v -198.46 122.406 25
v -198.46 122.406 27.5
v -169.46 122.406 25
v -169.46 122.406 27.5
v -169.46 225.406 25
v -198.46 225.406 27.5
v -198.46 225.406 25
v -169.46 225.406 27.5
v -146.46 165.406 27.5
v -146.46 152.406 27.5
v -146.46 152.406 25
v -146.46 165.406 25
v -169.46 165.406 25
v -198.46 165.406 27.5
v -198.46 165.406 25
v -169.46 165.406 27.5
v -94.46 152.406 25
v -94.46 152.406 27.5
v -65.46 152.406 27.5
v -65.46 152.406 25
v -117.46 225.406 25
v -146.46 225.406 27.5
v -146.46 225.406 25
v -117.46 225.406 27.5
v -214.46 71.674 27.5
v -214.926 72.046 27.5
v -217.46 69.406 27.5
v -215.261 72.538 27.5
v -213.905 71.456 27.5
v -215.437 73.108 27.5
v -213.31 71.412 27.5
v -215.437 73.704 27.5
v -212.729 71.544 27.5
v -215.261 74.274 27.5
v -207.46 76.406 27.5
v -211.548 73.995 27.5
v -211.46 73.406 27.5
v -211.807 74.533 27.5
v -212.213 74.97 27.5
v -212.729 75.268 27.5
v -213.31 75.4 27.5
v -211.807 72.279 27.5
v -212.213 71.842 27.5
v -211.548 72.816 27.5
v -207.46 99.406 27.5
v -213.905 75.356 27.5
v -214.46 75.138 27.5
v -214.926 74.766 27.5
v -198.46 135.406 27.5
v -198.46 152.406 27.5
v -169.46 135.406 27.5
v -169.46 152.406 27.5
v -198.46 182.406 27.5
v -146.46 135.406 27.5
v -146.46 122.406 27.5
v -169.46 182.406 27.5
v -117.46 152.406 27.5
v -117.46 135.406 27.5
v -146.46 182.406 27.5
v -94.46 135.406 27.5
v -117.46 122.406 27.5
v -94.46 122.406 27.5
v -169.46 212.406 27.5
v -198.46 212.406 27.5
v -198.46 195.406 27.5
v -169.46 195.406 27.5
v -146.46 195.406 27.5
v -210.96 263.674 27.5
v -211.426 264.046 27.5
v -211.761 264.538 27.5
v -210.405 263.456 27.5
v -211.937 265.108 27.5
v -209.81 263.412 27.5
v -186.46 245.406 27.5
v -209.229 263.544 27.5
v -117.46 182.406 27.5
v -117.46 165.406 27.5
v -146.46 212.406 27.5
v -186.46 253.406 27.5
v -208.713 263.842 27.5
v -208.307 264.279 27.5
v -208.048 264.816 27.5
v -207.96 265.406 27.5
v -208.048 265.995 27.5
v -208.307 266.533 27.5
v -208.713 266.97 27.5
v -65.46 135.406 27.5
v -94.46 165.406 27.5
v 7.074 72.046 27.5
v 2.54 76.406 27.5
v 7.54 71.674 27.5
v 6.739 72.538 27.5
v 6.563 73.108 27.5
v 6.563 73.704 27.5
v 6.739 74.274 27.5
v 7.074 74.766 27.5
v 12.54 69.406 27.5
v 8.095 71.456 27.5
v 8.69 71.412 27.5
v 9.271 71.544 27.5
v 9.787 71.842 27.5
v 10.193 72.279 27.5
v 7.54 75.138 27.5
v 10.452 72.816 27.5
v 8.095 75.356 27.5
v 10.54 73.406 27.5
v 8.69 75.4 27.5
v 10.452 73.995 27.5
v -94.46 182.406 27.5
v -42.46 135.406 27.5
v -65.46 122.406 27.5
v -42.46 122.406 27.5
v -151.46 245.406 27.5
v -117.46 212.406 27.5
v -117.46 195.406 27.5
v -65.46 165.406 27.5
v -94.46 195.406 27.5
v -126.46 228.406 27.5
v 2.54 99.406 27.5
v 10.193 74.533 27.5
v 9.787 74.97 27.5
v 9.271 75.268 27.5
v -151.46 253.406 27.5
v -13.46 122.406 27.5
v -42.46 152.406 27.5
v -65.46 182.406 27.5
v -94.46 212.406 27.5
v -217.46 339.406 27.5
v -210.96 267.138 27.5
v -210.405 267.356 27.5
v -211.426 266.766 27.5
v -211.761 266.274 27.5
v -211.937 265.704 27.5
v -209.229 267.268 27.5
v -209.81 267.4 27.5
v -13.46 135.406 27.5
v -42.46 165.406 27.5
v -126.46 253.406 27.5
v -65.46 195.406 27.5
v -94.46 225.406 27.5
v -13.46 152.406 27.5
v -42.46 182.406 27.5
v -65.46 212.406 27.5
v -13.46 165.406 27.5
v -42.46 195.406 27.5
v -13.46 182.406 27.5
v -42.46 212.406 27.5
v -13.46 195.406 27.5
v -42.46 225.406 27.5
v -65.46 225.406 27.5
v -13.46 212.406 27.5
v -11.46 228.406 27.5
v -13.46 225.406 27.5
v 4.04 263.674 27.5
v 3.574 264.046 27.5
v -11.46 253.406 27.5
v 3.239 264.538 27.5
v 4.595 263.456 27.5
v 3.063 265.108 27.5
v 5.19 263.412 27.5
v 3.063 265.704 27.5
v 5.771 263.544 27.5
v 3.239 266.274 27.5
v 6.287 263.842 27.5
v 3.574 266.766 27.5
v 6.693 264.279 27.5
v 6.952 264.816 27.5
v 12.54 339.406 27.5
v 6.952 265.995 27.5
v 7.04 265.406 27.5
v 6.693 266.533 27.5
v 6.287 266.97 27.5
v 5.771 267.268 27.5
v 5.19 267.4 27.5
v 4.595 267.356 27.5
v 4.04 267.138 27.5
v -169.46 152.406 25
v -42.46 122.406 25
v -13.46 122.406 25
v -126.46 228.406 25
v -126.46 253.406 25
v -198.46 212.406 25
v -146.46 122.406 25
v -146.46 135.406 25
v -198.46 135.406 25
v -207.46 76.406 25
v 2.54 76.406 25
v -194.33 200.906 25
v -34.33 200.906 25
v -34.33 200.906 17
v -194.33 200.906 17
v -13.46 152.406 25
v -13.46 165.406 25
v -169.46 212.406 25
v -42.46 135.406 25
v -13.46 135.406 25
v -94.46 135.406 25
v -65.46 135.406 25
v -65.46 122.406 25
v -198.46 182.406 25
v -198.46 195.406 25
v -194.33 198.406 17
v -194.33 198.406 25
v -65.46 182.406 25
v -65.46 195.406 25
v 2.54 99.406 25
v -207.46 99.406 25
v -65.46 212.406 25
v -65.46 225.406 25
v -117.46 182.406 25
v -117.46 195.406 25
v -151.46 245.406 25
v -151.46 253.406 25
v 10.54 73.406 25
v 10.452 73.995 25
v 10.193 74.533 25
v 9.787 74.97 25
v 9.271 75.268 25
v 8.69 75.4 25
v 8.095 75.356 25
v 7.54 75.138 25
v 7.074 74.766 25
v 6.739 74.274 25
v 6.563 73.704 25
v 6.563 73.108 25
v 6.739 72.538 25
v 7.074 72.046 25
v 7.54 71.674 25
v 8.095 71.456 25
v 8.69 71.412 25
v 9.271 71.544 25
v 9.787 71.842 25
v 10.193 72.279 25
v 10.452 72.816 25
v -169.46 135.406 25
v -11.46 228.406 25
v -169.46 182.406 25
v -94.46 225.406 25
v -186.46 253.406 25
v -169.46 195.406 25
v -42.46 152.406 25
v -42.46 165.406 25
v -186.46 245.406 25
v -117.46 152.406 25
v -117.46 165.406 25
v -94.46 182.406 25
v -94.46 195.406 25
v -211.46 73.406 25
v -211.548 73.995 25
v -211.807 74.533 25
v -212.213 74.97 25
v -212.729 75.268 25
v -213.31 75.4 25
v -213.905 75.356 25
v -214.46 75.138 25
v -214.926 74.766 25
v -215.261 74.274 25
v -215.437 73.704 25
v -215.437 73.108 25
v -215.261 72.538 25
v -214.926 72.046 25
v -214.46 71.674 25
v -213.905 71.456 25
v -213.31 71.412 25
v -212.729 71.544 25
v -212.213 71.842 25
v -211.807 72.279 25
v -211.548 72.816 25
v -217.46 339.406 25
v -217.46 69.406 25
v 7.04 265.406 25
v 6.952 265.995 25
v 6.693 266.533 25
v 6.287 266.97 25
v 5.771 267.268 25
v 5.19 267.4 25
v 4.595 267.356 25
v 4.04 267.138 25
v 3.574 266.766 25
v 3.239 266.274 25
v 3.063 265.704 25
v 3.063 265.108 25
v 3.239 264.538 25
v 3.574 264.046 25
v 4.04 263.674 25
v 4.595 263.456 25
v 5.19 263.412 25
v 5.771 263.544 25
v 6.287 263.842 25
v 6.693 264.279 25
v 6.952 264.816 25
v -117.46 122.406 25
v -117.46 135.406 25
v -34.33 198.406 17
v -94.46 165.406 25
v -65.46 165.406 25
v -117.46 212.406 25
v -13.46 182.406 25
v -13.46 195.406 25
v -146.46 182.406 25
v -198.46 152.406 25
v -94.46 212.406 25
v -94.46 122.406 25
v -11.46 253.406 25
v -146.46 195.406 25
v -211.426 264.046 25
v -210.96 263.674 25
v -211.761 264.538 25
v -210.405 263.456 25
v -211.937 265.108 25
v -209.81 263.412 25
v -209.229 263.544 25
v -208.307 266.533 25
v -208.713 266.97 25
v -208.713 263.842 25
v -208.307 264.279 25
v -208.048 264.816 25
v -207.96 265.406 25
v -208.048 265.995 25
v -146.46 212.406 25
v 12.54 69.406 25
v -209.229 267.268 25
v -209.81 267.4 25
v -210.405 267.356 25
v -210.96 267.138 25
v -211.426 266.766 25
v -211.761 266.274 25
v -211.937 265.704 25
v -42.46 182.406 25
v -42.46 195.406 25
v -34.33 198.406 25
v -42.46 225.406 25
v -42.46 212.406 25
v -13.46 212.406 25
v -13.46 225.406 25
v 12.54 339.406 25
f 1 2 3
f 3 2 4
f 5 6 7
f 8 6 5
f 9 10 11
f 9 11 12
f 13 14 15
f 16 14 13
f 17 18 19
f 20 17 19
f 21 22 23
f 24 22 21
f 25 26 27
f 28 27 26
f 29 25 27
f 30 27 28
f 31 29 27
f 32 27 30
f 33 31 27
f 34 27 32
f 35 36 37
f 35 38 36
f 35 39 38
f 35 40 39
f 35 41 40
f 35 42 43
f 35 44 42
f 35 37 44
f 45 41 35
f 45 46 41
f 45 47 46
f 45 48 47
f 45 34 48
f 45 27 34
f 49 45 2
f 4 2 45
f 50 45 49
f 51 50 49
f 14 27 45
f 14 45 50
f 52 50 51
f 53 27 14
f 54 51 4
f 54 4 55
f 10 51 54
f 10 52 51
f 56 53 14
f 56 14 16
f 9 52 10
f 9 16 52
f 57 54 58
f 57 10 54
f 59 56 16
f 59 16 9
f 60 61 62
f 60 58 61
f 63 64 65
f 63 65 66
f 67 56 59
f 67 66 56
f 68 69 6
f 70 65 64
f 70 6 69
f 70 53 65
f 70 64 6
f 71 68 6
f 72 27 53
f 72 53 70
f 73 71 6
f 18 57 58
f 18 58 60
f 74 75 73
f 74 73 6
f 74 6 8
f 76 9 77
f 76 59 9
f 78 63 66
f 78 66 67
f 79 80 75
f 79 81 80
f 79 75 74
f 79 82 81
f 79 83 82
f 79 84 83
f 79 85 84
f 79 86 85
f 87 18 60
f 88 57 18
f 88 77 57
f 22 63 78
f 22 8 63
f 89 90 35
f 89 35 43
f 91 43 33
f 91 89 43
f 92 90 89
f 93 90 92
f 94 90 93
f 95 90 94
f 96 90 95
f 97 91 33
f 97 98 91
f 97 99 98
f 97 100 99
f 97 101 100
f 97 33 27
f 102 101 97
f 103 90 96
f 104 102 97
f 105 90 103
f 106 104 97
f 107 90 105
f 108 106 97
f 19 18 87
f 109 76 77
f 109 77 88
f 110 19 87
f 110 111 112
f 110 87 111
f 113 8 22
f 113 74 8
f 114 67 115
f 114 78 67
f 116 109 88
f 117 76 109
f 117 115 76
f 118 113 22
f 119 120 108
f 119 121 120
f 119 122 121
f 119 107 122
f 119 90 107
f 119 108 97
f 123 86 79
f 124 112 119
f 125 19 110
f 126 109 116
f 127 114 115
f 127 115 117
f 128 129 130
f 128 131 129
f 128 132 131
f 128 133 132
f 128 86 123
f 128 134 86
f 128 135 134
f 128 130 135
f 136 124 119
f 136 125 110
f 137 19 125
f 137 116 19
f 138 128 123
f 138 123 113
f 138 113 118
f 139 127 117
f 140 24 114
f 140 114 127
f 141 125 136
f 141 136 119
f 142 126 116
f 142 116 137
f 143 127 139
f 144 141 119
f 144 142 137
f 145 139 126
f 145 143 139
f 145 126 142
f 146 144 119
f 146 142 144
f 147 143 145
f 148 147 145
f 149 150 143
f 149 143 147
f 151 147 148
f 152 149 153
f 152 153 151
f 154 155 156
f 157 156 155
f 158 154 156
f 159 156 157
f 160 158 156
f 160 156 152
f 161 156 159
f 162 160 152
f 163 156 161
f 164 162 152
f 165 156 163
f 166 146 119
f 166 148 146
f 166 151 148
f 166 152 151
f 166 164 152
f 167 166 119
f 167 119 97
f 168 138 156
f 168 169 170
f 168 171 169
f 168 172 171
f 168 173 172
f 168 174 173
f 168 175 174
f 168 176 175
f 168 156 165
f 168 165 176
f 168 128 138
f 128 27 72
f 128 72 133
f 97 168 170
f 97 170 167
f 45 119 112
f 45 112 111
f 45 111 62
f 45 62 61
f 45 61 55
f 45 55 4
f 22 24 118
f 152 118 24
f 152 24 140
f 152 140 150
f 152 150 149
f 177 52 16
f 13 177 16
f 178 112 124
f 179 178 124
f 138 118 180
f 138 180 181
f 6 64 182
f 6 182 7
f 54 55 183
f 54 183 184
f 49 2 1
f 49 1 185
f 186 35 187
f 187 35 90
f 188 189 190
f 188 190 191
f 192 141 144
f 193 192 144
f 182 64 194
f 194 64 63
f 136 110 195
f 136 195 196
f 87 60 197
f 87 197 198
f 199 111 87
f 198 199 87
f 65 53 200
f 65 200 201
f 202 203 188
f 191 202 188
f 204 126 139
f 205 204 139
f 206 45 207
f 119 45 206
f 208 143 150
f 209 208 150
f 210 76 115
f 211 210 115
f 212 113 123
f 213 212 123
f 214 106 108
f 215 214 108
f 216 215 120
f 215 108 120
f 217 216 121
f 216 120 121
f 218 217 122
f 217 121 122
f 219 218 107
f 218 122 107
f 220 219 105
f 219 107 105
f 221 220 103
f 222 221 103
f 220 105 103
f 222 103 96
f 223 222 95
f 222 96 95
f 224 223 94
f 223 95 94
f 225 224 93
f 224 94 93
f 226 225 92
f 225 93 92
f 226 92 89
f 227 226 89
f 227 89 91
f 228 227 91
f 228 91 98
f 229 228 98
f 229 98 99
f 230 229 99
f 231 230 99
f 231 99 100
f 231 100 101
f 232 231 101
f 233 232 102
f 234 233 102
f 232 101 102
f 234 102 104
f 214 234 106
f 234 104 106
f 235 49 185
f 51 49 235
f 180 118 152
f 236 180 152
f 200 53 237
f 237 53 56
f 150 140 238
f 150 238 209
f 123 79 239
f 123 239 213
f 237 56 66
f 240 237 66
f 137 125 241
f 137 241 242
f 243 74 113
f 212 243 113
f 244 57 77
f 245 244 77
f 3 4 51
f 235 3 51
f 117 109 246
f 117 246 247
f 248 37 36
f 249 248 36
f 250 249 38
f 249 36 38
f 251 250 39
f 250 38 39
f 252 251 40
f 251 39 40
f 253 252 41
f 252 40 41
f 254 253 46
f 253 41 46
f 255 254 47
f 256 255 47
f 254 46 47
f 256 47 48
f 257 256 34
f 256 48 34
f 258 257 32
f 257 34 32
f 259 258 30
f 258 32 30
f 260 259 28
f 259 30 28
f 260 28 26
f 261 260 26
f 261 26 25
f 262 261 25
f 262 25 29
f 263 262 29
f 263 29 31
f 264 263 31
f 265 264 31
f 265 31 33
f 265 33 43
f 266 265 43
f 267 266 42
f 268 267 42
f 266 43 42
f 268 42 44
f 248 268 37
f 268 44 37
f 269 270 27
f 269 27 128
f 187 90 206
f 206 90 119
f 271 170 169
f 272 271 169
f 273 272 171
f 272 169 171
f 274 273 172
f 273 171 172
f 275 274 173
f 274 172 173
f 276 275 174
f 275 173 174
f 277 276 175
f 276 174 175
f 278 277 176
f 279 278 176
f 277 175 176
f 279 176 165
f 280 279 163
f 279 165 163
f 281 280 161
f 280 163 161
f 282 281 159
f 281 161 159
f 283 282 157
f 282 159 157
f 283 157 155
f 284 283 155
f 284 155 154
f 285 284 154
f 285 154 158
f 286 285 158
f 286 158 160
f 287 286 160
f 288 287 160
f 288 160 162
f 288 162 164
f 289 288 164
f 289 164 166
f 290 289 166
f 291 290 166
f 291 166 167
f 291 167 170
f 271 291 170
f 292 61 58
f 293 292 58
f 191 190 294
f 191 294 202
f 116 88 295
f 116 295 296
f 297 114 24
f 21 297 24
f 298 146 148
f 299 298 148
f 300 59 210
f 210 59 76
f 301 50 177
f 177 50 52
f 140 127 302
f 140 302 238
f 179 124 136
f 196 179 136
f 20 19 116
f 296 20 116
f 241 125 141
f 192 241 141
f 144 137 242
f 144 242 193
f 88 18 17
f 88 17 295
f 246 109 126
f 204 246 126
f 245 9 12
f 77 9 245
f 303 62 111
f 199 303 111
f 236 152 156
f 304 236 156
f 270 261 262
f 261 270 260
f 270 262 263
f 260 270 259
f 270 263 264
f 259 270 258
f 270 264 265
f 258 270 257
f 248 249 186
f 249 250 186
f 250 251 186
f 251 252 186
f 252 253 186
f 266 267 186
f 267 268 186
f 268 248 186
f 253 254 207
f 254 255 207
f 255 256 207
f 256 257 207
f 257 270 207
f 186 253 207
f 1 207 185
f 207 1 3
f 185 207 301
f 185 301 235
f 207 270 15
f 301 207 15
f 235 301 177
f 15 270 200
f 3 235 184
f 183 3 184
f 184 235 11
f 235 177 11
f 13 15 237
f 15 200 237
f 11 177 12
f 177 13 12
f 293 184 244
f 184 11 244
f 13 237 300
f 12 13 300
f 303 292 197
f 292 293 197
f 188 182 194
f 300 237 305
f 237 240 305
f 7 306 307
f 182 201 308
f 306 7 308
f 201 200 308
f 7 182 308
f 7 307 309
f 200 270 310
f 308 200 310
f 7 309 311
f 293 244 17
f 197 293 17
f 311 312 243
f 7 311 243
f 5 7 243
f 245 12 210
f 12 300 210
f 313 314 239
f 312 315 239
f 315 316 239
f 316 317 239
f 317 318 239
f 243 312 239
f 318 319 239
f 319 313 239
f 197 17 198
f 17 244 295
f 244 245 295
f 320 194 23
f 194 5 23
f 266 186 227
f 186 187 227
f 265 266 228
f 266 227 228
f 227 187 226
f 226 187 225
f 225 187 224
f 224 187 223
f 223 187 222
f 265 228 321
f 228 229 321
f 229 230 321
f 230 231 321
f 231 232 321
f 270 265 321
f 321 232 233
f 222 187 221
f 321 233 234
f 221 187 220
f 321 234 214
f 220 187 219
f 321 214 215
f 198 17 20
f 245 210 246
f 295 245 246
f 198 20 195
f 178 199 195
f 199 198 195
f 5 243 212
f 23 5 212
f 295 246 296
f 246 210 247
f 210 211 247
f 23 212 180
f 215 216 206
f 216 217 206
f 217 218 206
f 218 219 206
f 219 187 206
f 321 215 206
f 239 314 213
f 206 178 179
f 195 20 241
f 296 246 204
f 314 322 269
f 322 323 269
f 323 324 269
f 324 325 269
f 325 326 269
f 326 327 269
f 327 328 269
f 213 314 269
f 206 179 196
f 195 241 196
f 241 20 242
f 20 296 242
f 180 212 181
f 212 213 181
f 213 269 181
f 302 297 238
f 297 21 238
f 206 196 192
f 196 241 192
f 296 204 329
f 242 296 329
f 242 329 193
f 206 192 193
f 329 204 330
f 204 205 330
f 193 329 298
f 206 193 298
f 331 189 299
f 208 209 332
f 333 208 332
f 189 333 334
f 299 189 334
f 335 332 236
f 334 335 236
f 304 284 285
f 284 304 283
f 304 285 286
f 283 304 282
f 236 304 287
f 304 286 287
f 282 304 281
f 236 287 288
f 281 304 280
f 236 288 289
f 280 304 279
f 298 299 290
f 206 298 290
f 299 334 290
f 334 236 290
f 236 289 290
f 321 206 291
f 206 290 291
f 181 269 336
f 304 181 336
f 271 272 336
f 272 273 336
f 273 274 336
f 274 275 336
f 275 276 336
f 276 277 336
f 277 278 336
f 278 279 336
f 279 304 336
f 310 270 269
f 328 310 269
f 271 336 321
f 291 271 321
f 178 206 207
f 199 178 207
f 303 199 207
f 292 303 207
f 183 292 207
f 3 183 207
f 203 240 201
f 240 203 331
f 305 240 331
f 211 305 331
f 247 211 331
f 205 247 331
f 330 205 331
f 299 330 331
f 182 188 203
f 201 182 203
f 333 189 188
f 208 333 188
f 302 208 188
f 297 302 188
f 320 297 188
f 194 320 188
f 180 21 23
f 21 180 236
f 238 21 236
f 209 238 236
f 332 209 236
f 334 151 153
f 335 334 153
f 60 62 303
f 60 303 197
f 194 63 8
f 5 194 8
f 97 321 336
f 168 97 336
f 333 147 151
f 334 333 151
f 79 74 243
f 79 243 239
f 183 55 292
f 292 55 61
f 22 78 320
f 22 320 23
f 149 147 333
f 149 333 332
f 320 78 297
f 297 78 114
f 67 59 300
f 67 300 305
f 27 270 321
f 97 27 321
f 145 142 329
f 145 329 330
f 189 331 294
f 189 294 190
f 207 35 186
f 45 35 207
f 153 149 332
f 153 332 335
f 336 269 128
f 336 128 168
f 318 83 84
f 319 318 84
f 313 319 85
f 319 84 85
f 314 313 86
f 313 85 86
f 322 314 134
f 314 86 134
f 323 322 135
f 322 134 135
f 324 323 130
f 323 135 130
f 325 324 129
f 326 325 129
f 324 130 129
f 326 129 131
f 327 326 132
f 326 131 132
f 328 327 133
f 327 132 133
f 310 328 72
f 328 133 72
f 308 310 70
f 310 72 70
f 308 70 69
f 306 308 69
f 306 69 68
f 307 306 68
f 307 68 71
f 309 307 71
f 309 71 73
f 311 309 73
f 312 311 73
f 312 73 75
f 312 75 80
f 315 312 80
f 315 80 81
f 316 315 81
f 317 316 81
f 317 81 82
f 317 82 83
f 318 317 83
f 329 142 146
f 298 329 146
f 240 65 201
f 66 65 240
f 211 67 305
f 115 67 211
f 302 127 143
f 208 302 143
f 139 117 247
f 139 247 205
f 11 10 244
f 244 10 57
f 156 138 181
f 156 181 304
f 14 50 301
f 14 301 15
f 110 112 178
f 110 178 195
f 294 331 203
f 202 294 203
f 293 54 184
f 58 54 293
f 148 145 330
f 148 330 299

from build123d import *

# Parameters (mm, degrees)
ESQUISSE1_W             = 230
ESQUISSE1_H             = 270
BOSS_EXTRU_2_DEPTH      = 2.5
ENL_V_MAT_EXTRU_1_REACH = 405.102
ESQUISSE4_W             = 210
ESQUISSE4_H             = 23
ESQUISSE5_R             = 2
ENL_V_MAT_EXTRU_2_DEPTH = 2.5
ESQUISSE6_W             = 35
ESQUISSE6_H             = 8
ESQUISSE6_W_2           = 115
ESQUISSE6_H_2           = 25
ENL_V_MAT_EXTRU_3_DEPTH = 2.5
ESQUISSE7_W             = 29
ESQUISSE7_H             = 13
ENL_V_MAT_EXTRU_4_DEPTH = 2.5
ESQUISSE8_W             = 160
ESQUISSE8_H             = 2.5
BOSS_EXTRU_3_DEPTH      = 8
ESQUISSE9_R             = 2
ENL_V_MAT_EXTRU_5_DEPTH = 404.231037827
ESQUISSE11_R            = 2
ENL_V_MAT_EXTRU_6_DEPTH = 404.231037827


with BuildPart() as part:
    # Esquisse1 → Boss.-Extru.2 (new body)
    with BuildSketch(Plane.XY.offset(25)):
        with Locations((-102.459507472, 204.405925813)):
            Rectangle(ESQUISSE1_W, ESQUISSE1_H)
    extrude(amount=BOSS_EXTRU_2_DEPTH)

    # Esquisse4 → Enlèv. mat.-Extru.1 (cut, up to next)
    with BuildSketch(Plane.XY.offset(27.5), mode=Mode.PRIVATE) as enl_v_mat_extru_1_sk1:
        with Locations((-102.459507472, 87.905925813)):
            Rectangle(ESQUISSE4_W, ESQUISSE4_H)
    enl_v_mat_extru_1_tool1 = extrude(enl_v_mat_extru_1_sk1.sketch, amount=-ENL_V_MAT_EXTRU_1_REACH, mode=Mode.PRIVATE) & part.part
    add(enl_v_mat_extru_1_tool1.solids().sort_by_distance((-102.459507, 87.905926, 27.5))[0], mode=Mode.SUBTRACT)

    # Esquisse5 → Enlèv. mat.-Extru.2 (cut)
    with BuildSketch(Plane.XY.offset(27.5)):
        with Locations((-213.459507472, 73.405925813)):
            Circle(ESQUISSE5_R)
        with Locations((8.540492528, 73.405925813)):
            Circle(ESQUISSE5_R)
    extrude(amount=-ENL_V_MAT_EXTRU_2_DEPTH, mode=Mode.SUBTRACT)

    # Esquisse6 → Enlèv. mat.-Extru.3 (cut)
    with BuildSketch(Plane.XY.offset(27.5)):
        with Locations((-168.959507472, 249.405925813)):
            Rectangle(ESQUISSE6_W, ESQUISSE6_H)
        with Locations((-68.959507472, 240.905925813)):
            Rectangle(ESQUISSE6_W_2, ESQUISSE6_H_2)
    extrude(amount=-ENL_V_MAT_EXTRU_3_DEPTH, mode=Mode.SUBTRACT)

    # Esquisse7 → Enlèv. mat.-Extru.4 (cut)
    with BuildSketch(Plane.XY.offset(27.5)):
        with Locations((-131.959507472, 218.905925813)):
            Rectangle(ESQUISSE7_W, ESQUISSE7_H)
        with Locations((-183.959507472, 218.905925813)):
            Rectangle(ESQUISSE7_W, ESQUISSE7_H)
        with Locations((-79.959507472, 218.905925813)):
            Rectangle(ESQUISSE7_W, ESQUISSE7_H)
        with Locations((-27.959507472, 218.905925813)):
            Rectangle(ESQUISSE7_W, ESQUISSE7_H)
        with Locations((-131.959507472, 188.905925813)):
            Rectangle(ESQUISSE7_W, ESQUISSE7_H)
        with Locations((-79.959507472, 188.905925813)):
            Rectangle(ESQUISSE7_W, ESQUISSE7_H)
        with Locations((-27.959507472, 188.905925813)):
            Rectangle(ESQUISSE7_W, ESQUISSE7_H)
        with Locations((-131.959507472, 158.905925813)):
            Rectangle(ESQUISSE7_W, ESQUISSE7_H)
        with Locations((-79.959507472, 158.905925813)):
            Rectangle(ESQUISSE7_W, ESQUISSE7_H)
        with Locations((-27.959507472, 158.905925813)):
            Rectangle(ESQUISSE7_W, ESQUISSE7_H)
        with Locations((-131.959507472, 128.905925813)):
            Rectangle(ESQUISSE7_W, ESQUISSE7_H)
        with Locations((-79.959507472, 128.905925813)):
            Rectangle(ESQUISSE7_W, ESQUISSE7_H)
        with Locations((-27.959507472, 128.905925813)):
            Rectangle(ESQUISSE7_W, ESQUISSE7_H)
        with Locations((-183.959507472, 188.905925813)):
            Rectangle(ESQUISSE7_W, ESQUISSE7_H)
        with Locations((-183.959507472, 158.905925813)):
            Rectangle(ESQUISSE7_W, ESQUISSE7_H)
        with Locations((-183.959507472, 128.905925813)):
            Rectangle(ESQUISSE7_W, ESQUISSE7_H)
    extrude(amount=-ENL_V_MAT_EXTRU_4_DEPTH, mode=Mode.SUBTRACT)

    # Esquisse8 → Boss.-Extru.3 (add)
    with BuildSketch(Plane(origin=(0, 0, 25), x_dir=(-1, 0, 0), z_dir=(0, 0, -1))):
        with Locations((114.330010258, 199.655925813)):
            Rectangle(ESQUISSE8_W, ESQUISSE8_H)
    extrude(amount=BOSS_EXTRU_3_DEPTH)

    # Esquisse9 → Enlèv. mat.-Extru.5 (cut, through all)
    with BuildSketch(Plane.XY.offset(27.5)):
        with Locations((-209.959507472, 265.405925813)):
            Circle(ESQUISSE9_R)
    extrude(amount=-ENL_V_MAT_EXTRU_5_DEPTH, mode=Mode.SUBTRACT)

    # Esquisse11 → Enlèv. mat.-Extru.6 (cut, through all)
    with BuildSketch(Plane.XY.offset(27.5)):
        with Locations((5.040492528, 265.405925813)):
            Circle(ESQUISSE11_R)
    extrude(amount=-ENL_V_MAT_EXTRU_6_DEPTH, mode=Mode.SUBTRACT)


solid = part.part
